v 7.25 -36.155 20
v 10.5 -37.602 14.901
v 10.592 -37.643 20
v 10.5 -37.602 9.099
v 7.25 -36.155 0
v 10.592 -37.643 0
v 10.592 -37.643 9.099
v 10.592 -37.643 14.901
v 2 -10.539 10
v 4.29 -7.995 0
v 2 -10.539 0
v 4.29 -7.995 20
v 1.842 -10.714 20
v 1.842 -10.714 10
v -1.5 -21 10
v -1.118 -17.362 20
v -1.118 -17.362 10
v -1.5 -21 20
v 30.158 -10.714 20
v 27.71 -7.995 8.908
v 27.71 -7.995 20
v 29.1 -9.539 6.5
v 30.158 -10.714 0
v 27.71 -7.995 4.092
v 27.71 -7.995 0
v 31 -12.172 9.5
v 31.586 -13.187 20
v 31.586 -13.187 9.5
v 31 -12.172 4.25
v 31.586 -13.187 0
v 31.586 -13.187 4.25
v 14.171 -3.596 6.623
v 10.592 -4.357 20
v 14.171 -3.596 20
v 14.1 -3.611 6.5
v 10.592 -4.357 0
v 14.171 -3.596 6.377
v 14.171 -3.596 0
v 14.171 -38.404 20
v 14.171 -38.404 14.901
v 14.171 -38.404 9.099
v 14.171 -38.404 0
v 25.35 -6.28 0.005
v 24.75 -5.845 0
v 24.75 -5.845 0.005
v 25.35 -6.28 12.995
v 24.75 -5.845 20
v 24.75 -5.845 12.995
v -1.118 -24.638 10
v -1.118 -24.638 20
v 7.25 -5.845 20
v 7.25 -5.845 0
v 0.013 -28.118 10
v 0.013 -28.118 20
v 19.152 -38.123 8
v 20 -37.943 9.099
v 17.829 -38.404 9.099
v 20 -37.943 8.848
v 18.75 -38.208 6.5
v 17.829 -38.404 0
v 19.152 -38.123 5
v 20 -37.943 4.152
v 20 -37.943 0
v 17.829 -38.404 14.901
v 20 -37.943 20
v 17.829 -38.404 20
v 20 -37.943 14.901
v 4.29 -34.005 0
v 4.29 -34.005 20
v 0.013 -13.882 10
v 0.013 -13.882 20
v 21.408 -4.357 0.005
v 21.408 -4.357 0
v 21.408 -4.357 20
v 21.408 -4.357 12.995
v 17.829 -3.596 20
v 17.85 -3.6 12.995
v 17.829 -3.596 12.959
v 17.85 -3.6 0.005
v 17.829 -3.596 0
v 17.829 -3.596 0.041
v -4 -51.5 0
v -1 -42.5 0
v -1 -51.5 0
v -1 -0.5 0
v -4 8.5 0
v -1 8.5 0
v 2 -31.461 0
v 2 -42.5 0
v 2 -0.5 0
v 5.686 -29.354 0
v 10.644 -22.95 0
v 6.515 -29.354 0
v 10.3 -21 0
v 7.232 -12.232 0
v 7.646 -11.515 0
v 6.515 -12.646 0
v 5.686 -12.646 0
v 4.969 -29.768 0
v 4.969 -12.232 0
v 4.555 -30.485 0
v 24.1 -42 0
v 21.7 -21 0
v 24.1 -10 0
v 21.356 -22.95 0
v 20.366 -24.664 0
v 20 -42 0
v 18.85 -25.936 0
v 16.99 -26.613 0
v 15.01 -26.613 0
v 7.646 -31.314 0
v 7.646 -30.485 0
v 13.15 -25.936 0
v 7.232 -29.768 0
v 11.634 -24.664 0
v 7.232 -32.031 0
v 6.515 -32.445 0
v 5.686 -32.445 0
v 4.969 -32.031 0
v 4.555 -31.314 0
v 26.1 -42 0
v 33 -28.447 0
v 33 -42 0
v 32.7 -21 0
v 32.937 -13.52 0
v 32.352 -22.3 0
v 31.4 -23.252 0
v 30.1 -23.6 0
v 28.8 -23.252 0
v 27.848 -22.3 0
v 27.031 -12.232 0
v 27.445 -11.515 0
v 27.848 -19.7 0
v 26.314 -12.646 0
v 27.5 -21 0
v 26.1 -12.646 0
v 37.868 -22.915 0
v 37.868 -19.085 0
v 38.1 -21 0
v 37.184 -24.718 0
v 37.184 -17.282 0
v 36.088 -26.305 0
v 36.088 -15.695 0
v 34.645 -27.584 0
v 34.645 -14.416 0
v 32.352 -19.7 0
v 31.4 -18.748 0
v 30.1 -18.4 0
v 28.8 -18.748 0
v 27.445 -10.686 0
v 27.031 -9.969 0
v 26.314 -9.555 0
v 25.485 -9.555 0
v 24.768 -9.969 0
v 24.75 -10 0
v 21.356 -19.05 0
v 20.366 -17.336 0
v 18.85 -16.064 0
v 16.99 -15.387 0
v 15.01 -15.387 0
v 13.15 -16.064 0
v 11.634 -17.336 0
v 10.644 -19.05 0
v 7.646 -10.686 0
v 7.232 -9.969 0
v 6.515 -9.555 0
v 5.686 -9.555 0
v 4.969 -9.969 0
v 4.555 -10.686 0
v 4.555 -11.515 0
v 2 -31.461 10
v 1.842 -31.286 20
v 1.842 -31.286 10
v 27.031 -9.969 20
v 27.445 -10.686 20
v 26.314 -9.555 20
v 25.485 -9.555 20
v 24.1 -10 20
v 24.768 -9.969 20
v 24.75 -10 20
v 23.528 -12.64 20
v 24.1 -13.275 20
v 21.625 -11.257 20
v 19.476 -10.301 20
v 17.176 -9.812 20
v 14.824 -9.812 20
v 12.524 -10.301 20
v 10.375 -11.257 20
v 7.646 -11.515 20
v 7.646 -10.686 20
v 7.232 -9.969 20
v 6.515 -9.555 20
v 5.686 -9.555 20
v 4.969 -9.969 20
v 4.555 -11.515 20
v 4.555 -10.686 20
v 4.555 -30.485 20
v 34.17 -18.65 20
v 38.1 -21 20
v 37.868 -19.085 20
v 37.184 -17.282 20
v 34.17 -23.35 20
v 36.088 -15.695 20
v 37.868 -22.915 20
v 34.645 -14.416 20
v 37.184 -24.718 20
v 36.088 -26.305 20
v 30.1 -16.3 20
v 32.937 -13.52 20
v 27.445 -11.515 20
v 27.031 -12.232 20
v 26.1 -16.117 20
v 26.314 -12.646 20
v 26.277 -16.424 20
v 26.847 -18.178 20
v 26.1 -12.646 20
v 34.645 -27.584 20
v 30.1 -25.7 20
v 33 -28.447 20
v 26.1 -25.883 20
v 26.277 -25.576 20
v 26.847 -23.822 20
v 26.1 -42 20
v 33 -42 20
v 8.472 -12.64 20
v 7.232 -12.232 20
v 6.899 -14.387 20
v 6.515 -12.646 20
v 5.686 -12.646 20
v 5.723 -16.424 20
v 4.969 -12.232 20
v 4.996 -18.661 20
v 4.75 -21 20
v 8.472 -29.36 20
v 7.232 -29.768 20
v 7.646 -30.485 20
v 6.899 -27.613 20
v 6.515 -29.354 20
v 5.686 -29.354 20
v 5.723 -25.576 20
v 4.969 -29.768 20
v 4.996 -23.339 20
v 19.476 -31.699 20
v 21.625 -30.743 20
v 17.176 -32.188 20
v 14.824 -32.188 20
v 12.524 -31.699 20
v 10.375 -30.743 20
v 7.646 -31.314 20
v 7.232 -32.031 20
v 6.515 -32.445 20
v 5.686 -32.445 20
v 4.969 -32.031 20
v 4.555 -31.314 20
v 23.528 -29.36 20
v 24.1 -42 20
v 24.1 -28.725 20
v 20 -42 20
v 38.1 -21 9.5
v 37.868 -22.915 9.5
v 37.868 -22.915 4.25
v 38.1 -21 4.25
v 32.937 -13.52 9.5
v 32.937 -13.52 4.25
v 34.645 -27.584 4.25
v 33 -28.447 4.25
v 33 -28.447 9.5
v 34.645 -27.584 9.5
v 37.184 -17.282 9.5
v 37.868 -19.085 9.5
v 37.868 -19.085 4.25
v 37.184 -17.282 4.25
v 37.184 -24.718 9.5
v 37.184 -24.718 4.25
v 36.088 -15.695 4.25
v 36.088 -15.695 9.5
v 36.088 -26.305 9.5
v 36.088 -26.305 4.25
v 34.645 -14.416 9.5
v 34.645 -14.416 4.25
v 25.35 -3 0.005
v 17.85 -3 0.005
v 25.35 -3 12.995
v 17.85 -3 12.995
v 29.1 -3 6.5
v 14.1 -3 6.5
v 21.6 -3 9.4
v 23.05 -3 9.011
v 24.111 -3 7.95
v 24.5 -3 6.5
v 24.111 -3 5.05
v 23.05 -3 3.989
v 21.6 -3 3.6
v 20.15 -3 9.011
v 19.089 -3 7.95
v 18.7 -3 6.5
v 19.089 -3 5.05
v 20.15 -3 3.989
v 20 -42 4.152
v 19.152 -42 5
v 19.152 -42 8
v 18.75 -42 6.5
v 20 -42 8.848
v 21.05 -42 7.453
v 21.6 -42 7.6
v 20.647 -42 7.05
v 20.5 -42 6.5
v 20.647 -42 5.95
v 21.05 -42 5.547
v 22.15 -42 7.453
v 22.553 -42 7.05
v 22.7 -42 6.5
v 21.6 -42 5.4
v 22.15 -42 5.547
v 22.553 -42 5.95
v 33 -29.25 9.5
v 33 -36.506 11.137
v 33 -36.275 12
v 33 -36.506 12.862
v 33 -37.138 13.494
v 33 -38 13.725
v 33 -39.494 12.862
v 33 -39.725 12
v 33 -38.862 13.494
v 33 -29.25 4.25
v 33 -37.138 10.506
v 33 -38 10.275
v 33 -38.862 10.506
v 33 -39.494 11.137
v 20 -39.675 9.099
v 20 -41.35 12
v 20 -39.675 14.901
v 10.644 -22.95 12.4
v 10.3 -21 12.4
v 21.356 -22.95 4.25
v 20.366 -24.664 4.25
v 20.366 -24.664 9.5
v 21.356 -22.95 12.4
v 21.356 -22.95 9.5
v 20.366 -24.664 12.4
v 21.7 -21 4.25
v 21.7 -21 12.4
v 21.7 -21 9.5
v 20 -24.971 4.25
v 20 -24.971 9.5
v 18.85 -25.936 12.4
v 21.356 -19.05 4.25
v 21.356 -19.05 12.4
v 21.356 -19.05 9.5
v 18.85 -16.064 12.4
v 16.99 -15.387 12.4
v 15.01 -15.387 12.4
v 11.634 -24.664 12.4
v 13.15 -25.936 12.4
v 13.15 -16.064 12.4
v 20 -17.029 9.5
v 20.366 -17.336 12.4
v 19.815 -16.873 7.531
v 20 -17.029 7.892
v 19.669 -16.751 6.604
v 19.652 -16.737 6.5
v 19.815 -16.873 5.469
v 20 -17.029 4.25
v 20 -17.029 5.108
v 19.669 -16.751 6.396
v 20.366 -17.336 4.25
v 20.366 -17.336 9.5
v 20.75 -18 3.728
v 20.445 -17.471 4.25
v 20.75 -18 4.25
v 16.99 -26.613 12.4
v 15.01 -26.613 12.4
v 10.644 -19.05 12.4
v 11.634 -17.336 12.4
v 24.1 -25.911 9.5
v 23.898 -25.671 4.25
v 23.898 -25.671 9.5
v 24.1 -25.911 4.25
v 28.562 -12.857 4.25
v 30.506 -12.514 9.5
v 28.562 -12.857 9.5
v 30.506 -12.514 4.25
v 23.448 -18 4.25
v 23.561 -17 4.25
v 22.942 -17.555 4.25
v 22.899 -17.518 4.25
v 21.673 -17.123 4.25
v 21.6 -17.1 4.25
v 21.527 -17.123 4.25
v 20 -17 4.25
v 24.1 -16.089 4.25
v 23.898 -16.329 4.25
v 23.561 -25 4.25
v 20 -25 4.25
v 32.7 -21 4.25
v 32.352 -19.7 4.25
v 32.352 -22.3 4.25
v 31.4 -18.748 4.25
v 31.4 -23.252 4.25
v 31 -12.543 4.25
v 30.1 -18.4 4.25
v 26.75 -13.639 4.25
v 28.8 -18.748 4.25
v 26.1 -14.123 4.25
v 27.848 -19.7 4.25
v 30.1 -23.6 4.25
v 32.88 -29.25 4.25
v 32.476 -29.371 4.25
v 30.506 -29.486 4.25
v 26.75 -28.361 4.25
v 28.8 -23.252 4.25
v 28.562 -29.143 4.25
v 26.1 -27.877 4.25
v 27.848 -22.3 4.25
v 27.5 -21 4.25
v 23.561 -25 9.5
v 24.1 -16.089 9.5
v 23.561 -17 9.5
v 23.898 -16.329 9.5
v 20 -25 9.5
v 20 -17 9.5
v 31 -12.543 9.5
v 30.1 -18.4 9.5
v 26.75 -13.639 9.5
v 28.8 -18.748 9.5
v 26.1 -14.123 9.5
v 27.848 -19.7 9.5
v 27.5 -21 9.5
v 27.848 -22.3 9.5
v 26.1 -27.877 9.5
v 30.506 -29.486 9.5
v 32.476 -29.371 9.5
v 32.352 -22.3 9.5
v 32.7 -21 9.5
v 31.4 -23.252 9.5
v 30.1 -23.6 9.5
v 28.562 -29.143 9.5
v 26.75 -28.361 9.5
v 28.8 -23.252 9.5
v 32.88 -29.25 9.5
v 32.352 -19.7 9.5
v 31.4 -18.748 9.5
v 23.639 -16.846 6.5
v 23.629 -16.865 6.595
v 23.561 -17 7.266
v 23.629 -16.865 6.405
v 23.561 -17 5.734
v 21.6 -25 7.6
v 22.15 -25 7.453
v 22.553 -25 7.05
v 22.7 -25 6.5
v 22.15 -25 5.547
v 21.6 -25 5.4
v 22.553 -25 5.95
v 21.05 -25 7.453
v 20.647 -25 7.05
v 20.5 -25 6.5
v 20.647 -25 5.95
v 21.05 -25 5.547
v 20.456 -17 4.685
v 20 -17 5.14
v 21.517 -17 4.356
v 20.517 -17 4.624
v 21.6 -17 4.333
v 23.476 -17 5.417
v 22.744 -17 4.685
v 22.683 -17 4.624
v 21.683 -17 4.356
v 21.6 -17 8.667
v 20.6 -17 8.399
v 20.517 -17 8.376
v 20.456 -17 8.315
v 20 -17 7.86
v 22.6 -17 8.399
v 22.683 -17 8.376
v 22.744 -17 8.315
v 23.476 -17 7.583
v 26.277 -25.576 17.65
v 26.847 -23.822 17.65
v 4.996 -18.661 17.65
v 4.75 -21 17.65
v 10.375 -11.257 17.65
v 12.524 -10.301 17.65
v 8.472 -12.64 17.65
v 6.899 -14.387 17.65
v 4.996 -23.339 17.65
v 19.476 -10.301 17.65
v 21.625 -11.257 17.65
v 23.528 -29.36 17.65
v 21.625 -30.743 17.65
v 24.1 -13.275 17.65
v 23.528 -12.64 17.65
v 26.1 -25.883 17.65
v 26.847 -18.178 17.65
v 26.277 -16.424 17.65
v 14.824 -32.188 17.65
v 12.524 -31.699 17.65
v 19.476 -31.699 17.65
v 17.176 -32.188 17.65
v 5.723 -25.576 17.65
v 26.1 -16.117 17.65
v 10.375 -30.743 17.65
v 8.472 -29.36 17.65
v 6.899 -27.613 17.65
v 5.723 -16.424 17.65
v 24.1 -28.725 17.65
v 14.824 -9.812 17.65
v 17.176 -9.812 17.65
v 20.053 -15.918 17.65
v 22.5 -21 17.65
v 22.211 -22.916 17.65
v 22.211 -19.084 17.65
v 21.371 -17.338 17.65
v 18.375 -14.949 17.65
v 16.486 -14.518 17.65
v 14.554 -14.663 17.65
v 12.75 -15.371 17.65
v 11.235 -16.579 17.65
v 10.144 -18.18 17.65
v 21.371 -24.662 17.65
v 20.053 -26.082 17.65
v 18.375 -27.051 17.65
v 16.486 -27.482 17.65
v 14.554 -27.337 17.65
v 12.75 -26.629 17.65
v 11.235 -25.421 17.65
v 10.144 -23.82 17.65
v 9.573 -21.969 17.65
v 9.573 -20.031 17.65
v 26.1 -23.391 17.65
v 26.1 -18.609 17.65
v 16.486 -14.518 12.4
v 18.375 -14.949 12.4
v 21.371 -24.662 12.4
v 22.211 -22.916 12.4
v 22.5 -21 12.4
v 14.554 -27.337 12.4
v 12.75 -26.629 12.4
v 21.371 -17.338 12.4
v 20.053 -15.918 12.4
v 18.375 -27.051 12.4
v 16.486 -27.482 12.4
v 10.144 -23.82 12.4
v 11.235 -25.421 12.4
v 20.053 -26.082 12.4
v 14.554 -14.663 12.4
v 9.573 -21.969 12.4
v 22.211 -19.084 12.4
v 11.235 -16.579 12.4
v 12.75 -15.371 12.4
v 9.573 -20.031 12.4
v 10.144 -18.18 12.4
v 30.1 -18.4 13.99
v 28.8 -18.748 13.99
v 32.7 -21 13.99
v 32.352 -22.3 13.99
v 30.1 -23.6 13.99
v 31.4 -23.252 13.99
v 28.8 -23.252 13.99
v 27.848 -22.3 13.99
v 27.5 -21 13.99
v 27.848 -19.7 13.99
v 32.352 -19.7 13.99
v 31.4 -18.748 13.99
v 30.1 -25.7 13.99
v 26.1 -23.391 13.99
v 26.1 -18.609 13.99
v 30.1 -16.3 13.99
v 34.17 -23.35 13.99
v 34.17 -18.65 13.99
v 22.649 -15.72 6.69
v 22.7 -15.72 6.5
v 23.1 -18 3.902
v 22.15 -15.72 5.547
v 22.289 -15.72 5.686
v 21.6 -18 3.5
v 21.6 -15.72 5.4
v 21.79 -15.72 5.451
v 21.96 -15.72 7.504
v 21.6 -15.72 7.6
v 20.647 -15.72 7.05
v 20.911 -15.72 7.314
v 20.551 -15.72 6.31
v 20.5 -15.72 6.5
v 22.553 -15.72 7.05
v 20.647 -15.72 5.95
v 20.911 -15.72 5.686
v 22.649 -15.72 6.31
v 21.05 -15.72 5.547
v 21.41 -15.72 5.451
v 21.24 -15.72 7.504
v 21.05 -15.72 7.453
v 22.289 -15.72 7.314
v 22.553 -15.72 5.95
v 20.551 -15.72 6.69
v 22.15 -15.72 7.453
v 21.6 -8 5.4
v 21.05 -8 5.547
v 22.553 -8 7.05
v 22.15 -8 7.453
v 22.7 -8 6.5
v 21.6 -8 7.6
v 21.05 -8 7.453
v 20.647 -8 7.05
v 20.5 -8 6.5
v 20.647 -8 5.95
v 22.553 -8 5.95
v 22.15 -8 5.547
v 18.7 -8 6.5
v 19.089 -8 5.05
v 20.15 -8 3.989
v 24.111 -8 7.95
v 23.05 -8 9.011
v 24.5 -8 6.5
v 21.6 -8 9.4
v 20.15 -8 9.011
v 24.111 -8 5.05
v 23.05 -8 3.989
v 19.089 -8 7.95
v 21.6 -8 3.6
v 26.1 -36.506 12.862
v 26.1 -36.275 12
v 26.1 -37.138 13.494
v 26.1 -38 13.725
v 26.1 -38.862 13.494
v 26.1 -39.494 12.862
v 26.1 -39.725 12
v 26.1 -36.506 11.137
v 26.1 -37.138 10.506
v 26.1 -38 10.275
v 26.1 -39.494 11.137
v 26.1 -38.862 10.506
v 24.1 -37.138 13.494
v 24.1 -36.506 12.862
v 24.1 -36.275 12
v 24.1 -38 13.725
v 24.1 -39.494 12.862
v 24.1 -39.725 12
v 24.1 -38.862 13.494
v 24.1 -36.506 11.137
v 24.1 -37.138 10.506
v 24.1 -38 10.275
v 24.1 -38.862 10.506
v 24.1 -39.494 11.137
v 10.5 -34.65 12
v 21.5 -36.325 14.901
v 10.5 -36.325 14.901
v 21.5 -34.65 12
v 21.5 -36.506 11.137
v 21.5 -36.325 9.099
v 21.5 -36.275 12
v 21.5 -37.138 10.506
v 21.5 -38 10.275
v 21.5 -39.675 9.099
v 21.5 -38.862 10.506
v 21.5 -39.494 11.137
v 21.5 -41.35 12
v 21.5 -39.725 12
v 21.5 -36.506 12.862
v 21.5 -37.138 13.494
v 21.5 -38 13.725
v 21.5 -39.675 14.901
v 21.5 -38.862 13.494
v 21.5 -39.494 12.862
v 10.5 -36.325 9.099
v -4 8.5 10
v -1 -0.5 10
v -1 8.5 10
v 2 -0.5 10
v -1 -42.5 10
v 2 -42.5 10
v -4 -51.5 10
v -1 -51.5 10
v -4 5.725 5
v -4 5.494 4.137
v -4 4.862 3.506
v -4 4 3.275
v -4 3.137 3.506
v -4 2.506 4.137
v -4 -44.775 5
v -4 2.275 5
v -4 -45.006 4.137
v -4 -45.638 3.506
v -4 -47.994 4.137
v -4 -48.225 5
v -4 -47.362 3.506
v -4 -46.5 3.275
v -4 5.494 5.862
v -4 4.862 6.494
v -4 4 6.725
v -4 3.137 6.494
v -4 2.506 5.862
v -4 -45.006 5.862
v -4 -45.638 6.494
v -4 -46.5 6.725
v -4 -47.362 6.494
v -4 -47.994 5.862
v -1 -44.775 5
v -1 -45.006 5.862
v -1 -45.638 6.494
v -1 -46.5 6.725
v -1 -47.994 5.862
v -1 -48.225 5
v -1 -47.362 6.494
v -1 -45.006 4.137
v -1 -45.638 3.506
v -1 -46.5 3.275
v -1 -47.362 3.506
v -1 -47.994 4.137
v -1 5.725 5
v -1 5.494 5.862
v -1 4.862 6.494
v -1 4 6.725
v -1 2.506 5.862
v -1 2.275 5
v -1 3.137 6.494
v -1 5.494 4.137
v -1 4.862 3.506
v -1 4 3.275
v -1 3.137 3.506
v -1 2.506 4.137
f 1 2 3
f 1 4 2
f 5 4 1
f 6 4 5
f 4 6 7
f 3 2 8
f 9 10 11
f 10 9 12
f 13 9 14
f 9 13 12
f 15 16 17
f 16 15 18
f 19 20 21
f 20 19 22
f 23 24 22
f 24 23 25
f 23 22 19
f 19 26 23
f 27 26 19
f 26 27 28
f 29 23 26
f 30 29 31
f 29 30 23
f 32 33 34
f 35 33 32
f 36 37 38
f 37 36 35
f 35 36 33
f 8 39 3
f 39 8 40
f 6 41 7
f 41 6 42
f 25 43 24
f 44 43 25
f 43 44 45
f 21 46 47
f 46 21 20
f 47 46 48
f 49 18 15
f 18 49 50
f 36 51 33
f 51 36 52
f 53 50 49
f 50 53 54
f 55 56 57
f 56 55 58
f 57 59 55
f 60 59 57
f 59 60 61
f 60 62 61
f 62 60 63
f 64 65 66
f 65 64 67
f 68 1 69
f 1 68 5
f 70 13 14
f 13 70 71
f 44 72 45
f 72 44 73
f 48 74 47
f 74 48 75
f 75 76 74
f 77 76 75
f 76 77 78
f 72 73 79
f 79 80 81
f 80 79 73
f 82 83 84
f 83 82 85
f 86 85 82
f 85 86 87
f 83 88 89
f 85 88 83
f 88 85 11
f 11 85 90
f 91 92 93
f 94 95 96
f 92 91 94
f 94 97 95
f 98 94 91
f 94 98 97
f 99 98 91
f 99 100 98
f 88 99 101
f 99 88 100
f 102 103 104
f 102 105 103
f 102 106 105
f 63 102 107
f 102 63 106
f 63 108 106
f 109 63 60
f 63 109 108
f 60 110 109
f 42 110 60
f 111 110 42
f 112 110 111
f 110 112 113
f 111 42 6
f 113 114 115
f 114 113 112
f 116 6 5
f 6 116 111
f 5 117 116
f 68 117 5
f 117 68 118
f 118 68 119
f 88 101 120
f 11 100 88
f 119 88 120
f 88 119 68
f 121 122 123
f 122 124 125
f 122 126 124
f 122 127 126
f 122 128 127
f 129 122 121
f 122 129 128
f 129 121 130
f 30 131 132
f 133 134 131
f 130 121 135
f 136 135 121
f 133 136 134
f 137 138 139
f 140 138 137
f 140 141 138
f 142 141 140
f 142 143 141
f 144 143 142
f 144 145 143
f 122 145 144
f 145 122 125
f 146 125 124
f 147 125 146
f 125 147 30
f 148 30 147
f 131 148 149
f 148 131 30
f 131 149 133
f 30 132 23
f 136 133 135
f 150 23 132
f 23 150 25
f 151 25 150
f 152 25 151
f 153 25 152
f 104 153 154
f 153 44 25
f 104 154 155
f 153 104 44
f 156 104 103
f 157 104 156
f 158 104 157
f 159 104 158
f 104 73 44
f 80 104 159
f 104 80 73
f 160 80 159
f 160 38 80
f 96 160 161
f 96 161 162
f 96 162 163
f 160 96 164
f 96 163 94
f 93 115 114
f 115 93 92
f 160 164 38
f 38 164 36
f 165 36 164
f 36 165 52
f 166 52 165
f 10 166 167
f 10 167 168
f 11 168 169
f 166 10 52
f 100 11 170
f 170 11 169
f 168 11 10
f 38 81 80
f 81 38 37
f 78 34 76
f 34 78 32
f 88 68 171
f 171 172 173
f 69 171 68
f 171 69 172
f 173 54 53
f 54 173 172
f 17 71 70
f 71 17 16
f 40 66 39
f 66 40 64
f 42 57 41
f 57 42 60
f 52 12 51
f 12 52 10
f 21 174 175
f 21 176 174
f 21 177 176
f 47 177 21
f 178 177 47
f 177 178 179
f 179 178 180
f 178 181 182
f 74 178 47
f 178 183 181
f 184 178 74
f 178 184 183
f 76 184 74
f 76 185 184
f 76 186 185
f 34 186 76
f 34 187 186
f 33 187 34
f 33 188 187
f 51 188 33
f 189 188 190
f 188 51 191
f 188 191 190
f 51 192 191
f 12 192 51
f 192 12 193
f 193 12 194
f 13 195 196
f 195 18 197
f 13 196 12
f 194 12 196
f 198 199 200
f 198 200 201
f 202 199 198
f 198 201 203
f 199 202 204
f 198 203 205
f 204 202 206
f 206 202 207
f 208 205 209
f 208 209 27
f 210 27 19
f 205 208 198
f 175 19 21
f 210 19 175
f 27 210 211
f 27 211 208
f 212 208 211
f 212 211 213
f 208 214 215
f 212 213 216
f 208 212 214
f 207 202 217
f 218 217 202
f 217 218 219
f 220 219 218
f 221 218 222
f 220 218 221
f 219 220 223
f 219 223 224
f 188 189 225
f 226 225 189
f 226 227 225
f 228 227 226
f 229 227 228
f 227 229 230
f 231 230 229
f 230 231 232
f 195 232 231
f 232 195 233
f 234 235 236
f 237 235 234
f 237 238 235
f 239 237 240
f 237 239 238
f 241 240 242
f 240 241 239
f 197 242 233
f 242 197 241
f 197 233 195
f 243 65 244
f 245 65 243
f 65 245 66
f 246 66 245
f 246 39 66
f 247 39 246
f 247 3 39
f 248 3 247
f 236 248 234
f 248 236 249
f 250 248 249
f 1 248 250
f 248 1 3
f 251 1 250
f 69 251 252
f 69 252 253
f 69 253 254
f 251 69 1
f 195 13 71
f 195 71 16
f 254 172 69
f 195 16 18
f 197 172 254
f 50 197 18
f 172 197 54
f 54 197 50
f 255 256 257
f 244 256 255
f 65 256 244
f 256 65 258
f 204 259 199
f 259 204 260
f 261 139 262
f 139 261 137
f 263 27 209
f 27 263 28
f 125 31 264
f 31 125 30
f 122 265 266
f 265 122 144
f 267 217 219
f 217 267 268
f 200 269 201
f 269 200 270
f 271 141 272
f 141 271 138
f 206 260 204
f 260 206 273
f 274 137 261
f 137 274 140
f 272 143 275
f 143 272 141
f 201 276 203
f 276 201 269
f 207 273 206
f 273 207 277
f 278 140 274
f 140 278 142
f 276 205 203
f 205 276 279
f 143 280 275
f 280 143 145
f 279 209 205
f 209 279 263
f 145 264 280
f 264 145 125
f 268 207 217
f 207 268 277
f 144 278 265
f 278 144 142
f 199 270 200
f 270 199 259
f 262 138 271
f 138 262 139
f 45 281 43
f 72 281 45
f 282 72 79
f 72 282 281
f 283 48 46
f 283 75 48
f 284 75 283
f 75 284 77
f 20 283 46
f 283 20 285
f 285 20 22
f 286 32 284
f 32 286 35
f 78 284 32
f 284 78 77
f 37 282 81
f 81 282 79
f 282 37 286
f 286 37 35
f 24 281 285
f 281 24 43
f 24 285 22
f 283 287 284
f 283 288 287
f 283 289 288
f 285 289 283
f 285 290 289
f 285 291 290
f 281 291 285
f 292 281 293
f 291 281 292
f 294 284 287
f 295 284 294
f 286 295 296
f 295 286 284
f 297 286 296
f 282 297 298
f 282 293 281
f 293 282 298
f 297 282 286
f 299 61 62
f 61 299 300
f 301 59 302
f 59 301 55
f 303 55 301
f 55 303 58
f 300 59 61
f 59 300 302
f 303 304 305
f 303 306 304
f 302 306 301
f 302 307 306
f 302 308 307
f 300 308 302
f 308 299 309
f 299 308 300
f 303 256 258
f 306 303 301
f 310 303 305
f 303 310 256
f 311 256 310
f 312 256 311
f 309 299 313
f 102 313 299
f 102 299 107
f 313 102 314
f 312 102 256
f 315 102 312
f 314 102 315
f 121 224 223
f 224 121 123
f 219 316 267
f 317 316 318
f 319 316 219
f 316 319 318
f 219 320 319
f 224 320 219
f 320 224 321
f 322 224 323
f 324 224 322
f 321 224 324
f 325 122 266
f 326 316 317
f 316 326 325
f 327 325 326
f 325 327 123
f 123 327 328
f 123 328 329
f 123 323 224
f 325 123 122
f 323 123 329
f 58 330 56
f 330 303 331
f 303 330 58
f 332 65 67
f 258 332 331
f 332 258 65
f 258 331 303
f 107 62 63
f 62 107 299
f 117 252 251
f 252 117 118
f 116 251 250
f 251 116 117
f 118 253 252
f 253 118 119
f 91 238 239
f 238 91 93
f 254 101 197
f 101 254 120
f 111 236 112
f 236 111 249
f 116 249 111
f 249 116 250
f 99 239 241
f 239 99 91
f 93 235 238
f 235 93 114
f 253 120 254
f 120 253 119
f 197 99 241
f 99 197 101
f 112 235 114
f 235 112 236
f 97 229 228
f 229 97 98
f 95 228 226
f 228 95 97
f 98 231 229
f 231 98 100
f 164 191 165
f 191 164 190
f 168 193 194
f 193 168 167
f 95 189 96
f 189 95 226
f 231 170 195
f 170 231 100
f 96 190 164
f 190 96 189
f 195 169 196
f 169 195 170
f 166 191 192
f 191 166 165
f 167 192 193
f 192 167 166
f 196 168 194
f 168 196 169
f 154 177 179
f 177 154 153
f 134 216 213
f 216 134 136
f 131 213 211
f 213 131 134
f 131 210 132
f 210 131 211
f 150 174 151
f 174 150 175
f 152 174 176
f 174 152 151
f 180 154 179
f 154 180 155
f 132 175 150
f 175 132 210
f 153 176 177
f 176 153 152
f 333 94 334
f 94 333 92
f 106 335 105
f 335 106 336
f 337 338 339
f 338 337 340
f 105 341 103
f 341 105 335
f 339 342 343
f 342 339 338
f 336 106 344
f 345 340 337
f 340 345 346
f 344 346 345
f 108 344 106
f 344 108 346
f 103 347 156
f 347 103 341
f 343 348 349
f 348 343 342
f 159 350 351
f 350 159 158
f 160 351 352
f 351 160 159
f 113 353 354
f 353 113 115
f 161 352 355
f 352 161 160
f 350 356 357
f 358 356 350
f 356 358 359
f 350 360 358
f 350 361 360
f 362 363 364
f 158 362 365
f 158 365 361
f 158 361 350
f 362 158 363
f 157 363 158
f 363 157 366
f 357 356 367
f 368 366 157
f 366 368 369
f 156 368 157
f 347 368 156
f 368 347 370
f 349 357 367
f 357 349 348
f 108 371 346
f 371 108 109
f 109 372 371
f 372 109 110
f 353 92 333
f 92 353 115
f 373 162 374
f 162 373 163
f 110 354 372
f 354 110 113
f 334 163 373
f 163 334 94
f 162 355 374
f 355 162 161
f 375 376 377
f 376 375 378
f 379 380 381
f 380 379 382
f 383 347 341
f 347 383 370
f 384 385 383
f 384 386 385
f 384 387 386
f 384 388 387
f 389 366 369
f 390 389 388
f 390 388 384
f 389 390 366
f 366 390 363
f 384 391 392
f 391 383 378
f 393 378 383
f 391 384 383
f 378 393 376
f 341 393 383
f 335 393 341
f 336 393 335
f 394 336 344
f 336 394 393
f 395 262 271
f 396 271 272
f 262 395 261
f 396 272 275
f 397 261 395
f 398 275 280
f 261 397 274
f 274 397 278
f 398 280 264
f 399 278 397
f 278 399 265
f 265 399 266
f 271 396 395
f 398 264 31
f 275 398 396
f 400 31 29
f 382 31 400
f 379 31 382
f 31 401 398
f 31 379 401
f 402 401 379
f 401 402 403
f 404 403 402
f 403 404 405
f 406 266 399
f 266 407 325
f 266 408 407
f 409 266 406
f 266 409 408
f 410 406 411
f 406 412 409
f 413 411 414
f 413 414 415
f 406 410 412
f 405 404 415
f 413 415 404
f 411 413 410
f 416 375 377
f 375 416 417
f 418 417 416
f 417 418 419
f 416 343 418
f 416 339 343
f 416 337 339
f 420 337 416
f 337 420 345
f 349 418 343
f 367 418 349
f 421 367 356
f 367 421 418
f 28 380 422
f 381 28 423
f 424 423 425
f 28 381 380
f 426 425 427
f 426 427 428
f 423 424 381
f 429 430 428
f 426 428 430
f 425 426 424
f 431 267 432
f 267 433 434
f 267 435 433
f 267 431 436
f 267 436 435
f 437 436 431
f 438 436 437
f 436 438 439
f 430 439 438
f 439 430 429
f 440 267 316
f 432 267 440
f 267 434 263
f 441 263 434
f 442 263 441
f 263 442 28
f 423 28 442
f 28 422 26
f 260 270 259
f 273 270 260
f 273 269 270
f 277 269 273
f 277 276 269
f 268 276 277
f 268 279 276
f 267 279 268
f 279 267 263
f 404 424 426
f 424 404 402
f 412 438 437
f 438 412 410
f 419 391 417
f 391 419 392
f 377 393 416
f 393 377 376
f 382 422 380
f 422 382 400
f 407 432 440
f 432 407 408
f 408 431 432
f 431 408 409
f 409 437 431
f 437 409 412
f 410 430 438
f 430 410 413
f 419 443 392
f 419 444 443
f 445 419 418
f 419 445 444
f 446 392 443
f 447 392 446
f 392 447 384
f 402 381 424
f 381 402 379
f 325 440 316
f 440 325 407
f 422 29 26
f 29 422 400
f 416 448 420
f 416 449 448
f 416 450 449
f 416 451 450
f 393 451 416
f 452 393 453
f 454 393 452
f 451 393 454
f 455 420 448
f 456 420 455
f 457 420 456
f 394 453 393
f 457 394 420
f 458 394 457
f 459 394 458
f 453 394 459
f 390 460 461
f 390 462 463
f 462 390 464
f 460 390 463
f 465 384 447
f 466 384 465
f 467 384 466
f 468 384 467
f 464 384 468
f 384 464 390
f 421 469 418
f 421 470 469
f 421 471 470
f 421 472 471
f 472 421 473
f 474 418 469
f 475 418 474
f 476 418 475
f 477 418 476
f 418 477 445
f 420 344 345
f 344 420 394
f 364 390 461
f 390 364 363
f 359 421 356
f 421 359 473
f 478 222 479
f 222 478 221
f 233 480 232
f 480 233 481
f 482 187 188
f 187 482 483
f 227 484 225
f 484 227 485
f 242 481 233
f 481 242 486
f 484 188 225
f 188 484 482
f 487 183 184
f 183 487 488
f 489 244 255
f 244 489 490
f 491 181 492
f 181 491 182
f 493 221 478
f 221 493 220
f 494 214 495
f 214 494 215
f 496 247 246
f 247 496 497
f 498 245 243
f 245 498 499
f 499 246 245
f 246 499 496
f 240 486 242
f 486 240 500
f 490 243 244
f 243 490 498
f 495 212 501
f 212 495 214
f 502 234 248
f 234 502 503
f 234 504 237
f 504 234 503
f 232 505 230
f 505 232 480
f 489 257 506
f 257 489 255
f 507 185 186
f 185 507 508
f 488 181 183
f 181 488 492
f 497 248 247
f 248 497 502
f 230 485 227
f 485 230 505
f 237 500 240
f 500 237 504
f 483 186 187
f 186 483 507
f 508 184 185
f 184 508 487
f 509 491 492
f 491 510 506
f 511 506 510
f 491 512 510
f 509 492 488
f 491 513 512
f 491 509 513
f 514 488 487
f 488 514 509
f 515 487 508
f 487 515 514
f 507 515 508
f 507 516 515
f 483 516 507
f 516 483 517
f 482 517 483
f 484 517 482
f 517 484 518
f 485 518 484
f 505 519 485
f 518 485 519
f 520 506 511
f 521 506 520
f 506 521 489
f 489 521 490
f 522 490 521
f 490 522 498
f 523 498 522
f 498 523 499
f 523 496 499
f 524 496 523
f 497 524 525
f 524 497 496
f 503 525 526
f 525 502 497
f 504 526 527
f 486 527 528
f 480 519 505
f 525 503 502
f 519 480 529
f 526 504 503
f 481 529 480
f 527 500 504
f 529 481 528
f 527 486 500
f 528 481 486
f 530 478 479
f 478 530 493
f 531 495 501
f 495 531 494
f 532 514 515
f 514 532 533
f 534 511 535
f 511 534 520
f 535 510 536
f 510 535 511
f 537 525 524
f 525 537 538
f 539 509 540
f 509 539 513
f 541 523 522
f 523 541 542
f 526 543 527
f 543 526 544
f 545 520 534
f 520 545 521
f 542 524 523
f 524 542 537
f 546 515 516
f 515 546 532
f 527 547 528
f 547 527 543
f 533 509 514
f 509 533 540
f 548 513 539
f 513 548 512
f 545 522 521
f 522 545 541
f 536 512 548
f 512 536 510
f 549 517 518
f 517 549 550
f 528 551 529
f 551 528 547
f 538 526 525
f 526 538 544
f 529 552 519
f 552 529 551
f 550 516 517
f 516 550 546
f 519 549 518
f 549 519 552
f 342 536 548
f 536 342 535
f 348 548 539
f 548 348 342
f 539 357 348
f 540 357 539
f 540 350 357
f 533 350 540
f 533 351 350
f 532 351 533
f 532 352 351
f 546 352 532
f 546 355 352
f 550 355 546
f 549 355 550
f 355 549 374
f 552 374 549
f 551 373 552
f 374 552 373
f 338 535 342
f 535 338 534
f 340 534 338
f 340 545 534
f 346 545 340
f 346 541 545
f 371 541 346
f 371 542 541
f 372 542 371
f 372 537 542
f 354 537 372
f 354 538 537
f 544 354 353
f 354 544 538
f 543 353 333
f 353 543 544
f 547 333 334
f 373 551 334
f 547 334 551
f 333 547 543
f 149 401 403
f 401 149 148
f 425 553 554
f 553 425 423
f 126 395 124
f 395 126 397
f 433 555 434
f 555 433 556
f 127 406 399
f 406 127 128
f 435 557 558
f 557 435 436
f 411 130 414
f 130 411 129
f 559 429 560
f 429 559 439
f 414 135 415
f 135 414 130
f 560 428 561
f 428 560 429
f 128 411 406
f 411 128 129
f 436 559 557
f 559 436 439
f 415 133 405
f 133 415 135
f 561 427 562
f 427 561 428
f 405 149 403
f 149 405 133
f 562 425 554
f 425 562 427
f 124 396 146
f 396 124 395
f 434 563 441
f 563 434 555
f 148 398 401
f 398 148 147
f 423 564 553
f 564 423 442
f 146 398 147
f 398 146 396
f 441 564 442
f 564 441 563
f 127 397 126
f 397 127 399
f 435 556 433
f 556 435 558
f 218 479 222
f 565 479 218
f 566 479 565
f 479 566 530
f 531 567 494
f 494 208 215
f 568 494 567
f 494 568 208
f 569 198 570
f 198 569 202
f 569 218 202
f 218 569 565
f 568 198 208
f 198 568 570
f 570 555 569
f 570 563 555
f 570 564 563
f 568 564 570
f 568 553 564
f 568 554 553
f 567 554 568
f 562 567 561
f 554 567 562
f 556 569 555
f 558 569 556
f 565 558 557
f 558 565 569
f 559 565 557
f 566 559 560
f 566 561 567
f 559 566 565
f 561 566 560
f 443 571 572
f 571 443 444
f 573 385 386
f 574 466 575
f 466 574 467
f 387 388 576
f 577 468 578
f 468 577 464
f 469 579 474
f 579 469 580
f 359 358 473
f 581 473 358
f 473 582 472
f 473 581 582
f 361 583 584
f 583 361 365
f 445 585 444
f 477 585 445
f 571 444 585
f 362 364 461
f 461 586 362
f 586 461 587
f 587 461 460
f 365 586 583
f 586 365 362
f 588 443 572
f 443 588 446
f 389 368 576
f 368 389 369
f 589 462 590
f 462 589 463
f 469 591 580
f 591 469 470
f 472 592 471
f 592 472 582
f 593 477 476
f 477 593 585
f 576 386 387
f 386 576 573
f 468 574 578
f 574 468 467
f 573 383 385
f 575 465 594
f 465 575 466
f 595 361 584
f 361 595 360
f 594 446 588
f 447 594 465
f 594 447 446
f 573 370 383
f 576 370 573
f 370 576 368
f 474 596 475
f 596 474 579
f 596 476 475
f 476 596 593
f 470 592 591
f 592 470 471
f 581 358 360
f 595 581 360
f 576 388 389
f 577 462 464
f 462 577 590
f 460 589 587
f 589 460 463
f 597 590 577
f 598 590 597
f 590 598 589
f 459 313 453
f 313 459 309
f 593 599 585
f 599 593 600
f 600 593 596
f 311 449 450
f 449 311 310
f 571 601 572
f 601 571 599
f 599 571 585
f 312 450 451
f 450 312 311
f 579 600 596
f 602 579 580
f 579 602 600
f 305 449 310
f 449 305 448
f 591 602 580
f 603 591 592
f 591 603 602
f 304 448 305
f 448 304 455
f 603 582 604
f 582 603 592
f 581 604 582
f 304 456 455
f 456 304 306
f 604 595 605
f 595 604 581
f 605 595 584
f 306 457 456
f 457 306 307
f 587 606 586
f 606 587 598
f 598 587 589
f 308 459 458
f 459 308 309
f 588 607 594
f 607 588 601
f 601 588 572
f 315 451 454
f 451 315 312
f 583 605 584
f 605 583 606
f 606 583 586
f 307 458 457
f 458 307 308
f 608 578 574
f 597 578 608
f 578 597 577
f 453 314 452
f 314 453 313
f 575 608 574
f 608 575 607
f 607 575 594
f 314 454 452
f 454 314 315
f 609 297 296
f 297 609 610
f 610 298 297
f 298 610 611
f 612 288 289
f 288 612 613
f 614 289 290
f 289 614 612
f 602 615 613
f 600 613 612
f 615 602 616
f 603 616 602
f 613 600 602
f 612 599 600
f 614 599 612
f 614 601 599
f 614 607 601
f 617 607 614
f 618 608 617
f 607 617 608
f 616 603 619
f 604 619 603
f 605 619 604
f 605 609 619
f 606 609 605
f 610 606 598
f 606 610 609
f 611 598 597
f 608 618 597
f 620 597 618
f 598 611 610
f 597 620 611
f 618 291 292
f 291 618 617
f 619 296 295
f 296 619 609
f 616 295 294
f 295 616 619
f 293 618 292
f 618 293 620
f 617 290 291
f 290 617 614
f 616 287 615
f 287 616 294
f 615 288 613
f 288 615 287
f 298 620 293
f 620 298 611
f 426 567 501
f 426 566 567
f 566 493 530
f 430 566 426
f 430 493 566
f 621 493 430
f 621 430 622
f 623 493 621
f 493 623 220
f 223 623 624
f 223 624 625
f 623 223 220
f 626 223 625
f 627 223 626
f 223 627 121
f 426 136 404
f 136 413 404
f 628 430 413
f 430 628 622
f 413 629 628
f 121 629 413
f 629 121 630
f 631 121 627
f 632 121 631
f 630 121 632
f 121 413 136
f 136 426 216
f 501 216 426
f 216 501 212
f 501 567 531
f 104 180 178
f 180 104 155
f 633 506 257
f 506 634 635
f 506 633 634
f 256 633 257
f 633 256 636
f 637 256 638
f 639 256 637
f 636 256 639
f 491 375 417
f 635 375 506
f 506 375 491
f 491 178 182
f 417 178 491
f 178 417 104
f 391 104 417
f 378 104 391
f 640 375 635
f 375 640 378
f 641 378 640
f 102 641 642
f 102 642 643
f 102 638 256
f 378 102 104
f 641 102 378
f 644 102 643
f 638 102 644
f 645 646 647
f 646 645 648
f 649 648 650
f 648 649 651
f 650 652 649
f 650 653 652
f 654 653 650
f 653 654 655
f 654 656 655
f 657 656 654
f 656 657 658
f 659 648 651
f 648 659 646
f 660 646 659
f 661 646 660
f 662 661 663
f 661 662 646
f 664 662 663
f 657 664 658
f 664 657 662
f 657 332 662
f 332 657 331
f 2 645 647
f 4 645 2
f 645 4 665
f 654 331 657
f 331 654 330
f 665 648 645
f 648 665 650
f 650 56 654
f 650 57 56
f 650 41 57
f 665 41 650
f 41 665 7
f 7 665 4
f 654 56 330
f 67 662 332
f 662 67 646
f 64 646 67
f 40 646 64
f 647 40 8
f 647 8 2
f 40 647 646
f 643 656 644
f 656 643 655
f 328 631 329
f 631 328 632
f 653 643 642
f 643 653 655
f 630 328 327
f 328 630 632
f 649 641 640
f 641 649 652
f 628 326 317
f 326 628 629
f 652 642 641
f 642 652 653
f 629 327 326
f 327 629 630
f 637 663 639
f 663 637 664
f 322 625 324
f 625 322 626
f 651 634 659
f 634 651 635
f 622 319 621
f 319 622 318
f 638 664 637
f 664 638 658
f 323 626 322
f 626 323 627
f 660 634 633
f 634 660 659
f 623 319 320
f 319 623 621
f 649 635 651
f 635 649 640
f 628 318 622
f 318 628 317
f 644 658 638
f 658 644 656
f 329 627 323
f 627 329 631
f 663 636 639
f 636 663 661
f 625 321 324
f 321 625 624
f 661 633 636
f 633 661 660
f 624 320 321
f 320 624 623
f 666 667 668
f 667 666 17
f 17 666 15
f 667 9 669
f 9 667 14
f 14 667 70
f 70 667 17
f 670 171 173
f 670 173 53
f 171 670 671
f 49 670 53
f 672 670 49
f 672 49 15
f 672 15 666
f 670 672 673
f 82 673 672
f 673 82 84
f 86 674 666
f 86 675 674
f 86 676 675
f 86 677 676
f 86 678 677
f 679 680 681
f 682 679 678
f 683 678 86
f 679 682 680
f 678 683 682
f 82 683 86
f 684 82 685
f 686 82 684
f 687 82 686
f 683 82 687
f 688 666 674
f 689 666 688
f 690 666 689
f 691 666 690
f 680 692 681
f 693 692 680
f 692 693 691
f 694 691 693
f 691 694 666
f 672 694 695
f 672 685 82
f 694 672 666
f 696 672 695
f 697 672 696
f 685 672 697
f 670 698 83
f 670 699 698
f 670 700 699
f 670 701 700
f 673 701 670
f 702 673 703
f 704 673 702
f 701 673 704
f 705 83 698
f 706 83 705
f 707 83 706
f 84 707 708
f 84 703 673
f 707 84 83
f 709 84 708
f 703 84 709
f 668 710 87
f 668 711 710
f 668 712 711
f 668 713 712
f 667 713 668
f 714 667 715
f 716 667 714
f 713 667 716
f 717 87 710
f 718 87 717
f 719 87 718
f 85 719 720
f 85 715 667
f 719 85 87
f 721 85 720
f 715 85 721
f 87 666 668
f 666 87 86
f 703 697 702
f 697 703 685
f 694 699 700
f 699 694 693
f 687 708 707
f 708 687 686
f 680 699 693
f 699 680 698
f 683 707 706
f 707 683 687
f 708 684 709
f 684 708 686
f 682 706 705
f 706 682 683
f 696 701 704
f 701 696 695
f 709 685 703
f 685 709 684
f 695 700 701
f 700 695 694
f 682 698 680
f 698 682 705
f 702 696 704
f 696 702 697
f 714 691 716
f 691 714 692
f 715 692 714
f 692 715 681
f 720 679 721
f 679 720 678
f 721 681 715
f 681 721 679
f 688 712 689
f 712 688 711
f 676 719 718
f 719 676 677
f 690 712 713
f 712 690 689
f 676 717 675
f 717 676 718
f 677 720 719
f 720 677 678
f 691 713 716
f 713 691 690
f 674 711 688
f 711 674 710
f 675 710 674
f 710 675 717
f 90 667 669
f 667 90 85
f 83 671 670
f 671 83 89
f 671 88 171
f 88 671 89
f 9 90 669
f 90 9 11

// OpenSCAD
// file: configuration.scad
// Increase this if your slicer or printer make holes too tight.
extra_radius = 0.1;

// OD = outside diameter, corner to corner.
m3_nut_od = 6.1;
m3_nut_radius = m3_nut_od/2 + 0.2 + extra_radius;
m3_washer_radius = 3.5 + extra_radius;

// Major diameter of metric 3mm thread.
m3_major = 2.85;
m3_radius = m3_major/2 + extra_radius;
m3_wide_radius = m3_major/2 + extra_radius + 0.2;

// NEMA17 stepper motors.
motor_shaft_diameter = 5;
motor_shaft_radius = motor_shaft_diameter/2 + extra_radius;

// Frame brackets. M3x8mm screws work best with 3.6 mm brackets.
thickness = 3.6;

// OpenBeam or Misumi. Currently only 15x15 mm, but there is a plan
// to make models more parametric and allow 20x20 mm in the future.
extrusion = 15;

// Placement for the NEMA17 stepper motors.
motor_offset = 44;
motor_length = 47;
// main file
/**************
SteExtruder by SteDf

Based on Johann's Kossel extruder from the repo files at
https://github.com/jcrocholl/kossel

which is Based on "Makergear Filament drive goes Bowden" by Luke321
http://www.thingiverse.com/thing:63674
**************/

include <configuration.scad>;

/**************
	ori_rad 	is the original radius of the pulley / spur gear
				it's the base for all the calculations, 
				so do not modify it !!!

	new_rad 	is the radius of the pulley / spur gear

	pn_rad 	is the radius of the pneumatic fit screw

	pi_rad 		is the extra radius for the pulley / spur gear indent

	pi_h 		is the height of the pulley / spur gear indent

	hmount	is to enable (1) or disable (0) the mounting bracket

	to obtain the same dimensions as per the original Johann's design just modify:
	new_rad = 6.6;
	pi_rad = 0.4;
	pi_h = 5.6;
	pn_rad = 2.3;
	hmount = 0;
**************/

ori_rad = 6.6;		// do not modify everything is based on this


// ************ Parameters
new_rad = 5.7;

pi_h=5.6; 			// original was 5.6
pi_rad = 0.8; 		// original was 0.4

pn_rad = 2.9;		// original was 2.3

hmount = 1;
// ************ End Parameters


filament_offset = 22.5 + (new_rad - ori_rad);

module extruder() {
  rotate([90, 0, 0]) difference() {
    union() {
      // ----- main cylinder
      translate([16,20,21]) rotate([90,0,0]) cylinder(h=20, r=17.5);

      // ----- bearing mount
	translate([31 + (new_rad - ori_rad),20,21]) rotate([90,0,0]) cylinder (h=20, r=8);

      // ----- pushfit/pneufit mount
      translate([filament_offset, 6.5, 13])
        cylinder(r=7.5, h=20, center=true, $fn=6);

      // ----- filament support
      translate([21.75,6.5,34]) rotate([0,0,0]) cylinder (h=8, r=3, $fn=12);

      // ----- clamp
      translate([20, 0, 28]) cube([13, 20, 14]);
    }

    // ----- pulley opening
    translate([16,21,21]) rotate([90,0,0]){
      cylinder (h=22, r=new_rad);

      rotate([0,0,45]) {
        //translate([14,0,0]) cylinder(h=22, r=1.6, $fn=12);
        translate([0,14,0]) cylinder(h=22, r=1.6, $fn=12);
        translate([-14,0,0]) cylinder(h=22, r=1.6, $fn=12);
        translate([0,-14,0]) cylinder(h=22, r=1.6, $fn=12);
      }
    }

    // ----- gearhead indentation
    translate([16,21,21]) rotate([90,0,0]) cylinder (h=3.35, r=11.25);

    // ----- pulley hub indentation
    translate([16,20-2,21]) rotate([90,0,0]) cylinder (h=pi_h, r=new_rad+pi_rad);

    // ----- bearing screws
    translate([31 + (new_rad - ori_rad),21,21]) rotate([90,0,0]) cylinder (h=22, r=2.6, $fn=12);
    #translate([31 + (new_rad - ori_rad),22,21]) rotate([90,30,0]) cylinder (h=8.01, r=4.7, $fn=6);

    // ----- bearing
    difference() {
      union() {
        translate([31,9.5,21]) rotate([90,0,0]) cylinder (h=5.25, r=8.5);
        translate([31,9.5-5.25,21-8.25-2]) cube([20, 5.25, 18.5]);
        // ----- opening between bearing and pulley
        translate([20,9.5-5.25,21-8.25+3.25+1]) cube([10, 5.25, 8]);
      }
      // ----- removable supports
     // for (z = [15:3:27]) {
      //  translate([36, 10, z]) # cube([20, 20, 0.5], center=true);
    //  }
    }

    // ----- filament path chamfer
    translate([filament_offset,6.5,15]) rotate([0,0,0]) #
      cylinder(h=3, r1=0.5, r2=3, $fn=12);

    // ----- filament path
    translate([filament_offset,6.5,-10]) rotate([0,0,0]) #
      cylinder(h=60, r=1.1, $fn=12);

    // ----- pushfit/pneufit mount
    translate([filament_offset, 6.5, 0]) # cylinder(r=pn_rad, h=8, $fn=12);

    // ----- clamp slit
    translate([25 + (new_rad - ori_rad),-1,10]) cube([2, 22, 35]);
    // ----- clamp nut
    translate([10.5,12,38]) rotate([0,90,0])
      cylinder(h=11, r=m3_nut_radius, $fn=6);
    // ----- clamp screw hole
    translate([15,12,38]) rotate([0,90,0])
      cylinder(h=20, r=m3_wide_radius, $fn=12);
  }

  // ----- with mounting bracket	
  if (hmount) {
	translate([2,-42.5,0]) rotate([0,0,90]) cube([42,4,10]);
	difference() {
  	  difference() {
	    translate([-1,-51.5,0]) rotate([0,0,90]) cube([60,3,10]);
          translate([-5,-51.5+5,0+5]) rotate([0,90,0]) cylinder(h=10, r=m3_wide_radius, $fn=12);
        }
          translate([-5,0+4,0+5]) rotate([0,90,0]) cylinder(h=10, r=m3_wide_radius, $fn=12 );
    }
 }
}

extruder();
